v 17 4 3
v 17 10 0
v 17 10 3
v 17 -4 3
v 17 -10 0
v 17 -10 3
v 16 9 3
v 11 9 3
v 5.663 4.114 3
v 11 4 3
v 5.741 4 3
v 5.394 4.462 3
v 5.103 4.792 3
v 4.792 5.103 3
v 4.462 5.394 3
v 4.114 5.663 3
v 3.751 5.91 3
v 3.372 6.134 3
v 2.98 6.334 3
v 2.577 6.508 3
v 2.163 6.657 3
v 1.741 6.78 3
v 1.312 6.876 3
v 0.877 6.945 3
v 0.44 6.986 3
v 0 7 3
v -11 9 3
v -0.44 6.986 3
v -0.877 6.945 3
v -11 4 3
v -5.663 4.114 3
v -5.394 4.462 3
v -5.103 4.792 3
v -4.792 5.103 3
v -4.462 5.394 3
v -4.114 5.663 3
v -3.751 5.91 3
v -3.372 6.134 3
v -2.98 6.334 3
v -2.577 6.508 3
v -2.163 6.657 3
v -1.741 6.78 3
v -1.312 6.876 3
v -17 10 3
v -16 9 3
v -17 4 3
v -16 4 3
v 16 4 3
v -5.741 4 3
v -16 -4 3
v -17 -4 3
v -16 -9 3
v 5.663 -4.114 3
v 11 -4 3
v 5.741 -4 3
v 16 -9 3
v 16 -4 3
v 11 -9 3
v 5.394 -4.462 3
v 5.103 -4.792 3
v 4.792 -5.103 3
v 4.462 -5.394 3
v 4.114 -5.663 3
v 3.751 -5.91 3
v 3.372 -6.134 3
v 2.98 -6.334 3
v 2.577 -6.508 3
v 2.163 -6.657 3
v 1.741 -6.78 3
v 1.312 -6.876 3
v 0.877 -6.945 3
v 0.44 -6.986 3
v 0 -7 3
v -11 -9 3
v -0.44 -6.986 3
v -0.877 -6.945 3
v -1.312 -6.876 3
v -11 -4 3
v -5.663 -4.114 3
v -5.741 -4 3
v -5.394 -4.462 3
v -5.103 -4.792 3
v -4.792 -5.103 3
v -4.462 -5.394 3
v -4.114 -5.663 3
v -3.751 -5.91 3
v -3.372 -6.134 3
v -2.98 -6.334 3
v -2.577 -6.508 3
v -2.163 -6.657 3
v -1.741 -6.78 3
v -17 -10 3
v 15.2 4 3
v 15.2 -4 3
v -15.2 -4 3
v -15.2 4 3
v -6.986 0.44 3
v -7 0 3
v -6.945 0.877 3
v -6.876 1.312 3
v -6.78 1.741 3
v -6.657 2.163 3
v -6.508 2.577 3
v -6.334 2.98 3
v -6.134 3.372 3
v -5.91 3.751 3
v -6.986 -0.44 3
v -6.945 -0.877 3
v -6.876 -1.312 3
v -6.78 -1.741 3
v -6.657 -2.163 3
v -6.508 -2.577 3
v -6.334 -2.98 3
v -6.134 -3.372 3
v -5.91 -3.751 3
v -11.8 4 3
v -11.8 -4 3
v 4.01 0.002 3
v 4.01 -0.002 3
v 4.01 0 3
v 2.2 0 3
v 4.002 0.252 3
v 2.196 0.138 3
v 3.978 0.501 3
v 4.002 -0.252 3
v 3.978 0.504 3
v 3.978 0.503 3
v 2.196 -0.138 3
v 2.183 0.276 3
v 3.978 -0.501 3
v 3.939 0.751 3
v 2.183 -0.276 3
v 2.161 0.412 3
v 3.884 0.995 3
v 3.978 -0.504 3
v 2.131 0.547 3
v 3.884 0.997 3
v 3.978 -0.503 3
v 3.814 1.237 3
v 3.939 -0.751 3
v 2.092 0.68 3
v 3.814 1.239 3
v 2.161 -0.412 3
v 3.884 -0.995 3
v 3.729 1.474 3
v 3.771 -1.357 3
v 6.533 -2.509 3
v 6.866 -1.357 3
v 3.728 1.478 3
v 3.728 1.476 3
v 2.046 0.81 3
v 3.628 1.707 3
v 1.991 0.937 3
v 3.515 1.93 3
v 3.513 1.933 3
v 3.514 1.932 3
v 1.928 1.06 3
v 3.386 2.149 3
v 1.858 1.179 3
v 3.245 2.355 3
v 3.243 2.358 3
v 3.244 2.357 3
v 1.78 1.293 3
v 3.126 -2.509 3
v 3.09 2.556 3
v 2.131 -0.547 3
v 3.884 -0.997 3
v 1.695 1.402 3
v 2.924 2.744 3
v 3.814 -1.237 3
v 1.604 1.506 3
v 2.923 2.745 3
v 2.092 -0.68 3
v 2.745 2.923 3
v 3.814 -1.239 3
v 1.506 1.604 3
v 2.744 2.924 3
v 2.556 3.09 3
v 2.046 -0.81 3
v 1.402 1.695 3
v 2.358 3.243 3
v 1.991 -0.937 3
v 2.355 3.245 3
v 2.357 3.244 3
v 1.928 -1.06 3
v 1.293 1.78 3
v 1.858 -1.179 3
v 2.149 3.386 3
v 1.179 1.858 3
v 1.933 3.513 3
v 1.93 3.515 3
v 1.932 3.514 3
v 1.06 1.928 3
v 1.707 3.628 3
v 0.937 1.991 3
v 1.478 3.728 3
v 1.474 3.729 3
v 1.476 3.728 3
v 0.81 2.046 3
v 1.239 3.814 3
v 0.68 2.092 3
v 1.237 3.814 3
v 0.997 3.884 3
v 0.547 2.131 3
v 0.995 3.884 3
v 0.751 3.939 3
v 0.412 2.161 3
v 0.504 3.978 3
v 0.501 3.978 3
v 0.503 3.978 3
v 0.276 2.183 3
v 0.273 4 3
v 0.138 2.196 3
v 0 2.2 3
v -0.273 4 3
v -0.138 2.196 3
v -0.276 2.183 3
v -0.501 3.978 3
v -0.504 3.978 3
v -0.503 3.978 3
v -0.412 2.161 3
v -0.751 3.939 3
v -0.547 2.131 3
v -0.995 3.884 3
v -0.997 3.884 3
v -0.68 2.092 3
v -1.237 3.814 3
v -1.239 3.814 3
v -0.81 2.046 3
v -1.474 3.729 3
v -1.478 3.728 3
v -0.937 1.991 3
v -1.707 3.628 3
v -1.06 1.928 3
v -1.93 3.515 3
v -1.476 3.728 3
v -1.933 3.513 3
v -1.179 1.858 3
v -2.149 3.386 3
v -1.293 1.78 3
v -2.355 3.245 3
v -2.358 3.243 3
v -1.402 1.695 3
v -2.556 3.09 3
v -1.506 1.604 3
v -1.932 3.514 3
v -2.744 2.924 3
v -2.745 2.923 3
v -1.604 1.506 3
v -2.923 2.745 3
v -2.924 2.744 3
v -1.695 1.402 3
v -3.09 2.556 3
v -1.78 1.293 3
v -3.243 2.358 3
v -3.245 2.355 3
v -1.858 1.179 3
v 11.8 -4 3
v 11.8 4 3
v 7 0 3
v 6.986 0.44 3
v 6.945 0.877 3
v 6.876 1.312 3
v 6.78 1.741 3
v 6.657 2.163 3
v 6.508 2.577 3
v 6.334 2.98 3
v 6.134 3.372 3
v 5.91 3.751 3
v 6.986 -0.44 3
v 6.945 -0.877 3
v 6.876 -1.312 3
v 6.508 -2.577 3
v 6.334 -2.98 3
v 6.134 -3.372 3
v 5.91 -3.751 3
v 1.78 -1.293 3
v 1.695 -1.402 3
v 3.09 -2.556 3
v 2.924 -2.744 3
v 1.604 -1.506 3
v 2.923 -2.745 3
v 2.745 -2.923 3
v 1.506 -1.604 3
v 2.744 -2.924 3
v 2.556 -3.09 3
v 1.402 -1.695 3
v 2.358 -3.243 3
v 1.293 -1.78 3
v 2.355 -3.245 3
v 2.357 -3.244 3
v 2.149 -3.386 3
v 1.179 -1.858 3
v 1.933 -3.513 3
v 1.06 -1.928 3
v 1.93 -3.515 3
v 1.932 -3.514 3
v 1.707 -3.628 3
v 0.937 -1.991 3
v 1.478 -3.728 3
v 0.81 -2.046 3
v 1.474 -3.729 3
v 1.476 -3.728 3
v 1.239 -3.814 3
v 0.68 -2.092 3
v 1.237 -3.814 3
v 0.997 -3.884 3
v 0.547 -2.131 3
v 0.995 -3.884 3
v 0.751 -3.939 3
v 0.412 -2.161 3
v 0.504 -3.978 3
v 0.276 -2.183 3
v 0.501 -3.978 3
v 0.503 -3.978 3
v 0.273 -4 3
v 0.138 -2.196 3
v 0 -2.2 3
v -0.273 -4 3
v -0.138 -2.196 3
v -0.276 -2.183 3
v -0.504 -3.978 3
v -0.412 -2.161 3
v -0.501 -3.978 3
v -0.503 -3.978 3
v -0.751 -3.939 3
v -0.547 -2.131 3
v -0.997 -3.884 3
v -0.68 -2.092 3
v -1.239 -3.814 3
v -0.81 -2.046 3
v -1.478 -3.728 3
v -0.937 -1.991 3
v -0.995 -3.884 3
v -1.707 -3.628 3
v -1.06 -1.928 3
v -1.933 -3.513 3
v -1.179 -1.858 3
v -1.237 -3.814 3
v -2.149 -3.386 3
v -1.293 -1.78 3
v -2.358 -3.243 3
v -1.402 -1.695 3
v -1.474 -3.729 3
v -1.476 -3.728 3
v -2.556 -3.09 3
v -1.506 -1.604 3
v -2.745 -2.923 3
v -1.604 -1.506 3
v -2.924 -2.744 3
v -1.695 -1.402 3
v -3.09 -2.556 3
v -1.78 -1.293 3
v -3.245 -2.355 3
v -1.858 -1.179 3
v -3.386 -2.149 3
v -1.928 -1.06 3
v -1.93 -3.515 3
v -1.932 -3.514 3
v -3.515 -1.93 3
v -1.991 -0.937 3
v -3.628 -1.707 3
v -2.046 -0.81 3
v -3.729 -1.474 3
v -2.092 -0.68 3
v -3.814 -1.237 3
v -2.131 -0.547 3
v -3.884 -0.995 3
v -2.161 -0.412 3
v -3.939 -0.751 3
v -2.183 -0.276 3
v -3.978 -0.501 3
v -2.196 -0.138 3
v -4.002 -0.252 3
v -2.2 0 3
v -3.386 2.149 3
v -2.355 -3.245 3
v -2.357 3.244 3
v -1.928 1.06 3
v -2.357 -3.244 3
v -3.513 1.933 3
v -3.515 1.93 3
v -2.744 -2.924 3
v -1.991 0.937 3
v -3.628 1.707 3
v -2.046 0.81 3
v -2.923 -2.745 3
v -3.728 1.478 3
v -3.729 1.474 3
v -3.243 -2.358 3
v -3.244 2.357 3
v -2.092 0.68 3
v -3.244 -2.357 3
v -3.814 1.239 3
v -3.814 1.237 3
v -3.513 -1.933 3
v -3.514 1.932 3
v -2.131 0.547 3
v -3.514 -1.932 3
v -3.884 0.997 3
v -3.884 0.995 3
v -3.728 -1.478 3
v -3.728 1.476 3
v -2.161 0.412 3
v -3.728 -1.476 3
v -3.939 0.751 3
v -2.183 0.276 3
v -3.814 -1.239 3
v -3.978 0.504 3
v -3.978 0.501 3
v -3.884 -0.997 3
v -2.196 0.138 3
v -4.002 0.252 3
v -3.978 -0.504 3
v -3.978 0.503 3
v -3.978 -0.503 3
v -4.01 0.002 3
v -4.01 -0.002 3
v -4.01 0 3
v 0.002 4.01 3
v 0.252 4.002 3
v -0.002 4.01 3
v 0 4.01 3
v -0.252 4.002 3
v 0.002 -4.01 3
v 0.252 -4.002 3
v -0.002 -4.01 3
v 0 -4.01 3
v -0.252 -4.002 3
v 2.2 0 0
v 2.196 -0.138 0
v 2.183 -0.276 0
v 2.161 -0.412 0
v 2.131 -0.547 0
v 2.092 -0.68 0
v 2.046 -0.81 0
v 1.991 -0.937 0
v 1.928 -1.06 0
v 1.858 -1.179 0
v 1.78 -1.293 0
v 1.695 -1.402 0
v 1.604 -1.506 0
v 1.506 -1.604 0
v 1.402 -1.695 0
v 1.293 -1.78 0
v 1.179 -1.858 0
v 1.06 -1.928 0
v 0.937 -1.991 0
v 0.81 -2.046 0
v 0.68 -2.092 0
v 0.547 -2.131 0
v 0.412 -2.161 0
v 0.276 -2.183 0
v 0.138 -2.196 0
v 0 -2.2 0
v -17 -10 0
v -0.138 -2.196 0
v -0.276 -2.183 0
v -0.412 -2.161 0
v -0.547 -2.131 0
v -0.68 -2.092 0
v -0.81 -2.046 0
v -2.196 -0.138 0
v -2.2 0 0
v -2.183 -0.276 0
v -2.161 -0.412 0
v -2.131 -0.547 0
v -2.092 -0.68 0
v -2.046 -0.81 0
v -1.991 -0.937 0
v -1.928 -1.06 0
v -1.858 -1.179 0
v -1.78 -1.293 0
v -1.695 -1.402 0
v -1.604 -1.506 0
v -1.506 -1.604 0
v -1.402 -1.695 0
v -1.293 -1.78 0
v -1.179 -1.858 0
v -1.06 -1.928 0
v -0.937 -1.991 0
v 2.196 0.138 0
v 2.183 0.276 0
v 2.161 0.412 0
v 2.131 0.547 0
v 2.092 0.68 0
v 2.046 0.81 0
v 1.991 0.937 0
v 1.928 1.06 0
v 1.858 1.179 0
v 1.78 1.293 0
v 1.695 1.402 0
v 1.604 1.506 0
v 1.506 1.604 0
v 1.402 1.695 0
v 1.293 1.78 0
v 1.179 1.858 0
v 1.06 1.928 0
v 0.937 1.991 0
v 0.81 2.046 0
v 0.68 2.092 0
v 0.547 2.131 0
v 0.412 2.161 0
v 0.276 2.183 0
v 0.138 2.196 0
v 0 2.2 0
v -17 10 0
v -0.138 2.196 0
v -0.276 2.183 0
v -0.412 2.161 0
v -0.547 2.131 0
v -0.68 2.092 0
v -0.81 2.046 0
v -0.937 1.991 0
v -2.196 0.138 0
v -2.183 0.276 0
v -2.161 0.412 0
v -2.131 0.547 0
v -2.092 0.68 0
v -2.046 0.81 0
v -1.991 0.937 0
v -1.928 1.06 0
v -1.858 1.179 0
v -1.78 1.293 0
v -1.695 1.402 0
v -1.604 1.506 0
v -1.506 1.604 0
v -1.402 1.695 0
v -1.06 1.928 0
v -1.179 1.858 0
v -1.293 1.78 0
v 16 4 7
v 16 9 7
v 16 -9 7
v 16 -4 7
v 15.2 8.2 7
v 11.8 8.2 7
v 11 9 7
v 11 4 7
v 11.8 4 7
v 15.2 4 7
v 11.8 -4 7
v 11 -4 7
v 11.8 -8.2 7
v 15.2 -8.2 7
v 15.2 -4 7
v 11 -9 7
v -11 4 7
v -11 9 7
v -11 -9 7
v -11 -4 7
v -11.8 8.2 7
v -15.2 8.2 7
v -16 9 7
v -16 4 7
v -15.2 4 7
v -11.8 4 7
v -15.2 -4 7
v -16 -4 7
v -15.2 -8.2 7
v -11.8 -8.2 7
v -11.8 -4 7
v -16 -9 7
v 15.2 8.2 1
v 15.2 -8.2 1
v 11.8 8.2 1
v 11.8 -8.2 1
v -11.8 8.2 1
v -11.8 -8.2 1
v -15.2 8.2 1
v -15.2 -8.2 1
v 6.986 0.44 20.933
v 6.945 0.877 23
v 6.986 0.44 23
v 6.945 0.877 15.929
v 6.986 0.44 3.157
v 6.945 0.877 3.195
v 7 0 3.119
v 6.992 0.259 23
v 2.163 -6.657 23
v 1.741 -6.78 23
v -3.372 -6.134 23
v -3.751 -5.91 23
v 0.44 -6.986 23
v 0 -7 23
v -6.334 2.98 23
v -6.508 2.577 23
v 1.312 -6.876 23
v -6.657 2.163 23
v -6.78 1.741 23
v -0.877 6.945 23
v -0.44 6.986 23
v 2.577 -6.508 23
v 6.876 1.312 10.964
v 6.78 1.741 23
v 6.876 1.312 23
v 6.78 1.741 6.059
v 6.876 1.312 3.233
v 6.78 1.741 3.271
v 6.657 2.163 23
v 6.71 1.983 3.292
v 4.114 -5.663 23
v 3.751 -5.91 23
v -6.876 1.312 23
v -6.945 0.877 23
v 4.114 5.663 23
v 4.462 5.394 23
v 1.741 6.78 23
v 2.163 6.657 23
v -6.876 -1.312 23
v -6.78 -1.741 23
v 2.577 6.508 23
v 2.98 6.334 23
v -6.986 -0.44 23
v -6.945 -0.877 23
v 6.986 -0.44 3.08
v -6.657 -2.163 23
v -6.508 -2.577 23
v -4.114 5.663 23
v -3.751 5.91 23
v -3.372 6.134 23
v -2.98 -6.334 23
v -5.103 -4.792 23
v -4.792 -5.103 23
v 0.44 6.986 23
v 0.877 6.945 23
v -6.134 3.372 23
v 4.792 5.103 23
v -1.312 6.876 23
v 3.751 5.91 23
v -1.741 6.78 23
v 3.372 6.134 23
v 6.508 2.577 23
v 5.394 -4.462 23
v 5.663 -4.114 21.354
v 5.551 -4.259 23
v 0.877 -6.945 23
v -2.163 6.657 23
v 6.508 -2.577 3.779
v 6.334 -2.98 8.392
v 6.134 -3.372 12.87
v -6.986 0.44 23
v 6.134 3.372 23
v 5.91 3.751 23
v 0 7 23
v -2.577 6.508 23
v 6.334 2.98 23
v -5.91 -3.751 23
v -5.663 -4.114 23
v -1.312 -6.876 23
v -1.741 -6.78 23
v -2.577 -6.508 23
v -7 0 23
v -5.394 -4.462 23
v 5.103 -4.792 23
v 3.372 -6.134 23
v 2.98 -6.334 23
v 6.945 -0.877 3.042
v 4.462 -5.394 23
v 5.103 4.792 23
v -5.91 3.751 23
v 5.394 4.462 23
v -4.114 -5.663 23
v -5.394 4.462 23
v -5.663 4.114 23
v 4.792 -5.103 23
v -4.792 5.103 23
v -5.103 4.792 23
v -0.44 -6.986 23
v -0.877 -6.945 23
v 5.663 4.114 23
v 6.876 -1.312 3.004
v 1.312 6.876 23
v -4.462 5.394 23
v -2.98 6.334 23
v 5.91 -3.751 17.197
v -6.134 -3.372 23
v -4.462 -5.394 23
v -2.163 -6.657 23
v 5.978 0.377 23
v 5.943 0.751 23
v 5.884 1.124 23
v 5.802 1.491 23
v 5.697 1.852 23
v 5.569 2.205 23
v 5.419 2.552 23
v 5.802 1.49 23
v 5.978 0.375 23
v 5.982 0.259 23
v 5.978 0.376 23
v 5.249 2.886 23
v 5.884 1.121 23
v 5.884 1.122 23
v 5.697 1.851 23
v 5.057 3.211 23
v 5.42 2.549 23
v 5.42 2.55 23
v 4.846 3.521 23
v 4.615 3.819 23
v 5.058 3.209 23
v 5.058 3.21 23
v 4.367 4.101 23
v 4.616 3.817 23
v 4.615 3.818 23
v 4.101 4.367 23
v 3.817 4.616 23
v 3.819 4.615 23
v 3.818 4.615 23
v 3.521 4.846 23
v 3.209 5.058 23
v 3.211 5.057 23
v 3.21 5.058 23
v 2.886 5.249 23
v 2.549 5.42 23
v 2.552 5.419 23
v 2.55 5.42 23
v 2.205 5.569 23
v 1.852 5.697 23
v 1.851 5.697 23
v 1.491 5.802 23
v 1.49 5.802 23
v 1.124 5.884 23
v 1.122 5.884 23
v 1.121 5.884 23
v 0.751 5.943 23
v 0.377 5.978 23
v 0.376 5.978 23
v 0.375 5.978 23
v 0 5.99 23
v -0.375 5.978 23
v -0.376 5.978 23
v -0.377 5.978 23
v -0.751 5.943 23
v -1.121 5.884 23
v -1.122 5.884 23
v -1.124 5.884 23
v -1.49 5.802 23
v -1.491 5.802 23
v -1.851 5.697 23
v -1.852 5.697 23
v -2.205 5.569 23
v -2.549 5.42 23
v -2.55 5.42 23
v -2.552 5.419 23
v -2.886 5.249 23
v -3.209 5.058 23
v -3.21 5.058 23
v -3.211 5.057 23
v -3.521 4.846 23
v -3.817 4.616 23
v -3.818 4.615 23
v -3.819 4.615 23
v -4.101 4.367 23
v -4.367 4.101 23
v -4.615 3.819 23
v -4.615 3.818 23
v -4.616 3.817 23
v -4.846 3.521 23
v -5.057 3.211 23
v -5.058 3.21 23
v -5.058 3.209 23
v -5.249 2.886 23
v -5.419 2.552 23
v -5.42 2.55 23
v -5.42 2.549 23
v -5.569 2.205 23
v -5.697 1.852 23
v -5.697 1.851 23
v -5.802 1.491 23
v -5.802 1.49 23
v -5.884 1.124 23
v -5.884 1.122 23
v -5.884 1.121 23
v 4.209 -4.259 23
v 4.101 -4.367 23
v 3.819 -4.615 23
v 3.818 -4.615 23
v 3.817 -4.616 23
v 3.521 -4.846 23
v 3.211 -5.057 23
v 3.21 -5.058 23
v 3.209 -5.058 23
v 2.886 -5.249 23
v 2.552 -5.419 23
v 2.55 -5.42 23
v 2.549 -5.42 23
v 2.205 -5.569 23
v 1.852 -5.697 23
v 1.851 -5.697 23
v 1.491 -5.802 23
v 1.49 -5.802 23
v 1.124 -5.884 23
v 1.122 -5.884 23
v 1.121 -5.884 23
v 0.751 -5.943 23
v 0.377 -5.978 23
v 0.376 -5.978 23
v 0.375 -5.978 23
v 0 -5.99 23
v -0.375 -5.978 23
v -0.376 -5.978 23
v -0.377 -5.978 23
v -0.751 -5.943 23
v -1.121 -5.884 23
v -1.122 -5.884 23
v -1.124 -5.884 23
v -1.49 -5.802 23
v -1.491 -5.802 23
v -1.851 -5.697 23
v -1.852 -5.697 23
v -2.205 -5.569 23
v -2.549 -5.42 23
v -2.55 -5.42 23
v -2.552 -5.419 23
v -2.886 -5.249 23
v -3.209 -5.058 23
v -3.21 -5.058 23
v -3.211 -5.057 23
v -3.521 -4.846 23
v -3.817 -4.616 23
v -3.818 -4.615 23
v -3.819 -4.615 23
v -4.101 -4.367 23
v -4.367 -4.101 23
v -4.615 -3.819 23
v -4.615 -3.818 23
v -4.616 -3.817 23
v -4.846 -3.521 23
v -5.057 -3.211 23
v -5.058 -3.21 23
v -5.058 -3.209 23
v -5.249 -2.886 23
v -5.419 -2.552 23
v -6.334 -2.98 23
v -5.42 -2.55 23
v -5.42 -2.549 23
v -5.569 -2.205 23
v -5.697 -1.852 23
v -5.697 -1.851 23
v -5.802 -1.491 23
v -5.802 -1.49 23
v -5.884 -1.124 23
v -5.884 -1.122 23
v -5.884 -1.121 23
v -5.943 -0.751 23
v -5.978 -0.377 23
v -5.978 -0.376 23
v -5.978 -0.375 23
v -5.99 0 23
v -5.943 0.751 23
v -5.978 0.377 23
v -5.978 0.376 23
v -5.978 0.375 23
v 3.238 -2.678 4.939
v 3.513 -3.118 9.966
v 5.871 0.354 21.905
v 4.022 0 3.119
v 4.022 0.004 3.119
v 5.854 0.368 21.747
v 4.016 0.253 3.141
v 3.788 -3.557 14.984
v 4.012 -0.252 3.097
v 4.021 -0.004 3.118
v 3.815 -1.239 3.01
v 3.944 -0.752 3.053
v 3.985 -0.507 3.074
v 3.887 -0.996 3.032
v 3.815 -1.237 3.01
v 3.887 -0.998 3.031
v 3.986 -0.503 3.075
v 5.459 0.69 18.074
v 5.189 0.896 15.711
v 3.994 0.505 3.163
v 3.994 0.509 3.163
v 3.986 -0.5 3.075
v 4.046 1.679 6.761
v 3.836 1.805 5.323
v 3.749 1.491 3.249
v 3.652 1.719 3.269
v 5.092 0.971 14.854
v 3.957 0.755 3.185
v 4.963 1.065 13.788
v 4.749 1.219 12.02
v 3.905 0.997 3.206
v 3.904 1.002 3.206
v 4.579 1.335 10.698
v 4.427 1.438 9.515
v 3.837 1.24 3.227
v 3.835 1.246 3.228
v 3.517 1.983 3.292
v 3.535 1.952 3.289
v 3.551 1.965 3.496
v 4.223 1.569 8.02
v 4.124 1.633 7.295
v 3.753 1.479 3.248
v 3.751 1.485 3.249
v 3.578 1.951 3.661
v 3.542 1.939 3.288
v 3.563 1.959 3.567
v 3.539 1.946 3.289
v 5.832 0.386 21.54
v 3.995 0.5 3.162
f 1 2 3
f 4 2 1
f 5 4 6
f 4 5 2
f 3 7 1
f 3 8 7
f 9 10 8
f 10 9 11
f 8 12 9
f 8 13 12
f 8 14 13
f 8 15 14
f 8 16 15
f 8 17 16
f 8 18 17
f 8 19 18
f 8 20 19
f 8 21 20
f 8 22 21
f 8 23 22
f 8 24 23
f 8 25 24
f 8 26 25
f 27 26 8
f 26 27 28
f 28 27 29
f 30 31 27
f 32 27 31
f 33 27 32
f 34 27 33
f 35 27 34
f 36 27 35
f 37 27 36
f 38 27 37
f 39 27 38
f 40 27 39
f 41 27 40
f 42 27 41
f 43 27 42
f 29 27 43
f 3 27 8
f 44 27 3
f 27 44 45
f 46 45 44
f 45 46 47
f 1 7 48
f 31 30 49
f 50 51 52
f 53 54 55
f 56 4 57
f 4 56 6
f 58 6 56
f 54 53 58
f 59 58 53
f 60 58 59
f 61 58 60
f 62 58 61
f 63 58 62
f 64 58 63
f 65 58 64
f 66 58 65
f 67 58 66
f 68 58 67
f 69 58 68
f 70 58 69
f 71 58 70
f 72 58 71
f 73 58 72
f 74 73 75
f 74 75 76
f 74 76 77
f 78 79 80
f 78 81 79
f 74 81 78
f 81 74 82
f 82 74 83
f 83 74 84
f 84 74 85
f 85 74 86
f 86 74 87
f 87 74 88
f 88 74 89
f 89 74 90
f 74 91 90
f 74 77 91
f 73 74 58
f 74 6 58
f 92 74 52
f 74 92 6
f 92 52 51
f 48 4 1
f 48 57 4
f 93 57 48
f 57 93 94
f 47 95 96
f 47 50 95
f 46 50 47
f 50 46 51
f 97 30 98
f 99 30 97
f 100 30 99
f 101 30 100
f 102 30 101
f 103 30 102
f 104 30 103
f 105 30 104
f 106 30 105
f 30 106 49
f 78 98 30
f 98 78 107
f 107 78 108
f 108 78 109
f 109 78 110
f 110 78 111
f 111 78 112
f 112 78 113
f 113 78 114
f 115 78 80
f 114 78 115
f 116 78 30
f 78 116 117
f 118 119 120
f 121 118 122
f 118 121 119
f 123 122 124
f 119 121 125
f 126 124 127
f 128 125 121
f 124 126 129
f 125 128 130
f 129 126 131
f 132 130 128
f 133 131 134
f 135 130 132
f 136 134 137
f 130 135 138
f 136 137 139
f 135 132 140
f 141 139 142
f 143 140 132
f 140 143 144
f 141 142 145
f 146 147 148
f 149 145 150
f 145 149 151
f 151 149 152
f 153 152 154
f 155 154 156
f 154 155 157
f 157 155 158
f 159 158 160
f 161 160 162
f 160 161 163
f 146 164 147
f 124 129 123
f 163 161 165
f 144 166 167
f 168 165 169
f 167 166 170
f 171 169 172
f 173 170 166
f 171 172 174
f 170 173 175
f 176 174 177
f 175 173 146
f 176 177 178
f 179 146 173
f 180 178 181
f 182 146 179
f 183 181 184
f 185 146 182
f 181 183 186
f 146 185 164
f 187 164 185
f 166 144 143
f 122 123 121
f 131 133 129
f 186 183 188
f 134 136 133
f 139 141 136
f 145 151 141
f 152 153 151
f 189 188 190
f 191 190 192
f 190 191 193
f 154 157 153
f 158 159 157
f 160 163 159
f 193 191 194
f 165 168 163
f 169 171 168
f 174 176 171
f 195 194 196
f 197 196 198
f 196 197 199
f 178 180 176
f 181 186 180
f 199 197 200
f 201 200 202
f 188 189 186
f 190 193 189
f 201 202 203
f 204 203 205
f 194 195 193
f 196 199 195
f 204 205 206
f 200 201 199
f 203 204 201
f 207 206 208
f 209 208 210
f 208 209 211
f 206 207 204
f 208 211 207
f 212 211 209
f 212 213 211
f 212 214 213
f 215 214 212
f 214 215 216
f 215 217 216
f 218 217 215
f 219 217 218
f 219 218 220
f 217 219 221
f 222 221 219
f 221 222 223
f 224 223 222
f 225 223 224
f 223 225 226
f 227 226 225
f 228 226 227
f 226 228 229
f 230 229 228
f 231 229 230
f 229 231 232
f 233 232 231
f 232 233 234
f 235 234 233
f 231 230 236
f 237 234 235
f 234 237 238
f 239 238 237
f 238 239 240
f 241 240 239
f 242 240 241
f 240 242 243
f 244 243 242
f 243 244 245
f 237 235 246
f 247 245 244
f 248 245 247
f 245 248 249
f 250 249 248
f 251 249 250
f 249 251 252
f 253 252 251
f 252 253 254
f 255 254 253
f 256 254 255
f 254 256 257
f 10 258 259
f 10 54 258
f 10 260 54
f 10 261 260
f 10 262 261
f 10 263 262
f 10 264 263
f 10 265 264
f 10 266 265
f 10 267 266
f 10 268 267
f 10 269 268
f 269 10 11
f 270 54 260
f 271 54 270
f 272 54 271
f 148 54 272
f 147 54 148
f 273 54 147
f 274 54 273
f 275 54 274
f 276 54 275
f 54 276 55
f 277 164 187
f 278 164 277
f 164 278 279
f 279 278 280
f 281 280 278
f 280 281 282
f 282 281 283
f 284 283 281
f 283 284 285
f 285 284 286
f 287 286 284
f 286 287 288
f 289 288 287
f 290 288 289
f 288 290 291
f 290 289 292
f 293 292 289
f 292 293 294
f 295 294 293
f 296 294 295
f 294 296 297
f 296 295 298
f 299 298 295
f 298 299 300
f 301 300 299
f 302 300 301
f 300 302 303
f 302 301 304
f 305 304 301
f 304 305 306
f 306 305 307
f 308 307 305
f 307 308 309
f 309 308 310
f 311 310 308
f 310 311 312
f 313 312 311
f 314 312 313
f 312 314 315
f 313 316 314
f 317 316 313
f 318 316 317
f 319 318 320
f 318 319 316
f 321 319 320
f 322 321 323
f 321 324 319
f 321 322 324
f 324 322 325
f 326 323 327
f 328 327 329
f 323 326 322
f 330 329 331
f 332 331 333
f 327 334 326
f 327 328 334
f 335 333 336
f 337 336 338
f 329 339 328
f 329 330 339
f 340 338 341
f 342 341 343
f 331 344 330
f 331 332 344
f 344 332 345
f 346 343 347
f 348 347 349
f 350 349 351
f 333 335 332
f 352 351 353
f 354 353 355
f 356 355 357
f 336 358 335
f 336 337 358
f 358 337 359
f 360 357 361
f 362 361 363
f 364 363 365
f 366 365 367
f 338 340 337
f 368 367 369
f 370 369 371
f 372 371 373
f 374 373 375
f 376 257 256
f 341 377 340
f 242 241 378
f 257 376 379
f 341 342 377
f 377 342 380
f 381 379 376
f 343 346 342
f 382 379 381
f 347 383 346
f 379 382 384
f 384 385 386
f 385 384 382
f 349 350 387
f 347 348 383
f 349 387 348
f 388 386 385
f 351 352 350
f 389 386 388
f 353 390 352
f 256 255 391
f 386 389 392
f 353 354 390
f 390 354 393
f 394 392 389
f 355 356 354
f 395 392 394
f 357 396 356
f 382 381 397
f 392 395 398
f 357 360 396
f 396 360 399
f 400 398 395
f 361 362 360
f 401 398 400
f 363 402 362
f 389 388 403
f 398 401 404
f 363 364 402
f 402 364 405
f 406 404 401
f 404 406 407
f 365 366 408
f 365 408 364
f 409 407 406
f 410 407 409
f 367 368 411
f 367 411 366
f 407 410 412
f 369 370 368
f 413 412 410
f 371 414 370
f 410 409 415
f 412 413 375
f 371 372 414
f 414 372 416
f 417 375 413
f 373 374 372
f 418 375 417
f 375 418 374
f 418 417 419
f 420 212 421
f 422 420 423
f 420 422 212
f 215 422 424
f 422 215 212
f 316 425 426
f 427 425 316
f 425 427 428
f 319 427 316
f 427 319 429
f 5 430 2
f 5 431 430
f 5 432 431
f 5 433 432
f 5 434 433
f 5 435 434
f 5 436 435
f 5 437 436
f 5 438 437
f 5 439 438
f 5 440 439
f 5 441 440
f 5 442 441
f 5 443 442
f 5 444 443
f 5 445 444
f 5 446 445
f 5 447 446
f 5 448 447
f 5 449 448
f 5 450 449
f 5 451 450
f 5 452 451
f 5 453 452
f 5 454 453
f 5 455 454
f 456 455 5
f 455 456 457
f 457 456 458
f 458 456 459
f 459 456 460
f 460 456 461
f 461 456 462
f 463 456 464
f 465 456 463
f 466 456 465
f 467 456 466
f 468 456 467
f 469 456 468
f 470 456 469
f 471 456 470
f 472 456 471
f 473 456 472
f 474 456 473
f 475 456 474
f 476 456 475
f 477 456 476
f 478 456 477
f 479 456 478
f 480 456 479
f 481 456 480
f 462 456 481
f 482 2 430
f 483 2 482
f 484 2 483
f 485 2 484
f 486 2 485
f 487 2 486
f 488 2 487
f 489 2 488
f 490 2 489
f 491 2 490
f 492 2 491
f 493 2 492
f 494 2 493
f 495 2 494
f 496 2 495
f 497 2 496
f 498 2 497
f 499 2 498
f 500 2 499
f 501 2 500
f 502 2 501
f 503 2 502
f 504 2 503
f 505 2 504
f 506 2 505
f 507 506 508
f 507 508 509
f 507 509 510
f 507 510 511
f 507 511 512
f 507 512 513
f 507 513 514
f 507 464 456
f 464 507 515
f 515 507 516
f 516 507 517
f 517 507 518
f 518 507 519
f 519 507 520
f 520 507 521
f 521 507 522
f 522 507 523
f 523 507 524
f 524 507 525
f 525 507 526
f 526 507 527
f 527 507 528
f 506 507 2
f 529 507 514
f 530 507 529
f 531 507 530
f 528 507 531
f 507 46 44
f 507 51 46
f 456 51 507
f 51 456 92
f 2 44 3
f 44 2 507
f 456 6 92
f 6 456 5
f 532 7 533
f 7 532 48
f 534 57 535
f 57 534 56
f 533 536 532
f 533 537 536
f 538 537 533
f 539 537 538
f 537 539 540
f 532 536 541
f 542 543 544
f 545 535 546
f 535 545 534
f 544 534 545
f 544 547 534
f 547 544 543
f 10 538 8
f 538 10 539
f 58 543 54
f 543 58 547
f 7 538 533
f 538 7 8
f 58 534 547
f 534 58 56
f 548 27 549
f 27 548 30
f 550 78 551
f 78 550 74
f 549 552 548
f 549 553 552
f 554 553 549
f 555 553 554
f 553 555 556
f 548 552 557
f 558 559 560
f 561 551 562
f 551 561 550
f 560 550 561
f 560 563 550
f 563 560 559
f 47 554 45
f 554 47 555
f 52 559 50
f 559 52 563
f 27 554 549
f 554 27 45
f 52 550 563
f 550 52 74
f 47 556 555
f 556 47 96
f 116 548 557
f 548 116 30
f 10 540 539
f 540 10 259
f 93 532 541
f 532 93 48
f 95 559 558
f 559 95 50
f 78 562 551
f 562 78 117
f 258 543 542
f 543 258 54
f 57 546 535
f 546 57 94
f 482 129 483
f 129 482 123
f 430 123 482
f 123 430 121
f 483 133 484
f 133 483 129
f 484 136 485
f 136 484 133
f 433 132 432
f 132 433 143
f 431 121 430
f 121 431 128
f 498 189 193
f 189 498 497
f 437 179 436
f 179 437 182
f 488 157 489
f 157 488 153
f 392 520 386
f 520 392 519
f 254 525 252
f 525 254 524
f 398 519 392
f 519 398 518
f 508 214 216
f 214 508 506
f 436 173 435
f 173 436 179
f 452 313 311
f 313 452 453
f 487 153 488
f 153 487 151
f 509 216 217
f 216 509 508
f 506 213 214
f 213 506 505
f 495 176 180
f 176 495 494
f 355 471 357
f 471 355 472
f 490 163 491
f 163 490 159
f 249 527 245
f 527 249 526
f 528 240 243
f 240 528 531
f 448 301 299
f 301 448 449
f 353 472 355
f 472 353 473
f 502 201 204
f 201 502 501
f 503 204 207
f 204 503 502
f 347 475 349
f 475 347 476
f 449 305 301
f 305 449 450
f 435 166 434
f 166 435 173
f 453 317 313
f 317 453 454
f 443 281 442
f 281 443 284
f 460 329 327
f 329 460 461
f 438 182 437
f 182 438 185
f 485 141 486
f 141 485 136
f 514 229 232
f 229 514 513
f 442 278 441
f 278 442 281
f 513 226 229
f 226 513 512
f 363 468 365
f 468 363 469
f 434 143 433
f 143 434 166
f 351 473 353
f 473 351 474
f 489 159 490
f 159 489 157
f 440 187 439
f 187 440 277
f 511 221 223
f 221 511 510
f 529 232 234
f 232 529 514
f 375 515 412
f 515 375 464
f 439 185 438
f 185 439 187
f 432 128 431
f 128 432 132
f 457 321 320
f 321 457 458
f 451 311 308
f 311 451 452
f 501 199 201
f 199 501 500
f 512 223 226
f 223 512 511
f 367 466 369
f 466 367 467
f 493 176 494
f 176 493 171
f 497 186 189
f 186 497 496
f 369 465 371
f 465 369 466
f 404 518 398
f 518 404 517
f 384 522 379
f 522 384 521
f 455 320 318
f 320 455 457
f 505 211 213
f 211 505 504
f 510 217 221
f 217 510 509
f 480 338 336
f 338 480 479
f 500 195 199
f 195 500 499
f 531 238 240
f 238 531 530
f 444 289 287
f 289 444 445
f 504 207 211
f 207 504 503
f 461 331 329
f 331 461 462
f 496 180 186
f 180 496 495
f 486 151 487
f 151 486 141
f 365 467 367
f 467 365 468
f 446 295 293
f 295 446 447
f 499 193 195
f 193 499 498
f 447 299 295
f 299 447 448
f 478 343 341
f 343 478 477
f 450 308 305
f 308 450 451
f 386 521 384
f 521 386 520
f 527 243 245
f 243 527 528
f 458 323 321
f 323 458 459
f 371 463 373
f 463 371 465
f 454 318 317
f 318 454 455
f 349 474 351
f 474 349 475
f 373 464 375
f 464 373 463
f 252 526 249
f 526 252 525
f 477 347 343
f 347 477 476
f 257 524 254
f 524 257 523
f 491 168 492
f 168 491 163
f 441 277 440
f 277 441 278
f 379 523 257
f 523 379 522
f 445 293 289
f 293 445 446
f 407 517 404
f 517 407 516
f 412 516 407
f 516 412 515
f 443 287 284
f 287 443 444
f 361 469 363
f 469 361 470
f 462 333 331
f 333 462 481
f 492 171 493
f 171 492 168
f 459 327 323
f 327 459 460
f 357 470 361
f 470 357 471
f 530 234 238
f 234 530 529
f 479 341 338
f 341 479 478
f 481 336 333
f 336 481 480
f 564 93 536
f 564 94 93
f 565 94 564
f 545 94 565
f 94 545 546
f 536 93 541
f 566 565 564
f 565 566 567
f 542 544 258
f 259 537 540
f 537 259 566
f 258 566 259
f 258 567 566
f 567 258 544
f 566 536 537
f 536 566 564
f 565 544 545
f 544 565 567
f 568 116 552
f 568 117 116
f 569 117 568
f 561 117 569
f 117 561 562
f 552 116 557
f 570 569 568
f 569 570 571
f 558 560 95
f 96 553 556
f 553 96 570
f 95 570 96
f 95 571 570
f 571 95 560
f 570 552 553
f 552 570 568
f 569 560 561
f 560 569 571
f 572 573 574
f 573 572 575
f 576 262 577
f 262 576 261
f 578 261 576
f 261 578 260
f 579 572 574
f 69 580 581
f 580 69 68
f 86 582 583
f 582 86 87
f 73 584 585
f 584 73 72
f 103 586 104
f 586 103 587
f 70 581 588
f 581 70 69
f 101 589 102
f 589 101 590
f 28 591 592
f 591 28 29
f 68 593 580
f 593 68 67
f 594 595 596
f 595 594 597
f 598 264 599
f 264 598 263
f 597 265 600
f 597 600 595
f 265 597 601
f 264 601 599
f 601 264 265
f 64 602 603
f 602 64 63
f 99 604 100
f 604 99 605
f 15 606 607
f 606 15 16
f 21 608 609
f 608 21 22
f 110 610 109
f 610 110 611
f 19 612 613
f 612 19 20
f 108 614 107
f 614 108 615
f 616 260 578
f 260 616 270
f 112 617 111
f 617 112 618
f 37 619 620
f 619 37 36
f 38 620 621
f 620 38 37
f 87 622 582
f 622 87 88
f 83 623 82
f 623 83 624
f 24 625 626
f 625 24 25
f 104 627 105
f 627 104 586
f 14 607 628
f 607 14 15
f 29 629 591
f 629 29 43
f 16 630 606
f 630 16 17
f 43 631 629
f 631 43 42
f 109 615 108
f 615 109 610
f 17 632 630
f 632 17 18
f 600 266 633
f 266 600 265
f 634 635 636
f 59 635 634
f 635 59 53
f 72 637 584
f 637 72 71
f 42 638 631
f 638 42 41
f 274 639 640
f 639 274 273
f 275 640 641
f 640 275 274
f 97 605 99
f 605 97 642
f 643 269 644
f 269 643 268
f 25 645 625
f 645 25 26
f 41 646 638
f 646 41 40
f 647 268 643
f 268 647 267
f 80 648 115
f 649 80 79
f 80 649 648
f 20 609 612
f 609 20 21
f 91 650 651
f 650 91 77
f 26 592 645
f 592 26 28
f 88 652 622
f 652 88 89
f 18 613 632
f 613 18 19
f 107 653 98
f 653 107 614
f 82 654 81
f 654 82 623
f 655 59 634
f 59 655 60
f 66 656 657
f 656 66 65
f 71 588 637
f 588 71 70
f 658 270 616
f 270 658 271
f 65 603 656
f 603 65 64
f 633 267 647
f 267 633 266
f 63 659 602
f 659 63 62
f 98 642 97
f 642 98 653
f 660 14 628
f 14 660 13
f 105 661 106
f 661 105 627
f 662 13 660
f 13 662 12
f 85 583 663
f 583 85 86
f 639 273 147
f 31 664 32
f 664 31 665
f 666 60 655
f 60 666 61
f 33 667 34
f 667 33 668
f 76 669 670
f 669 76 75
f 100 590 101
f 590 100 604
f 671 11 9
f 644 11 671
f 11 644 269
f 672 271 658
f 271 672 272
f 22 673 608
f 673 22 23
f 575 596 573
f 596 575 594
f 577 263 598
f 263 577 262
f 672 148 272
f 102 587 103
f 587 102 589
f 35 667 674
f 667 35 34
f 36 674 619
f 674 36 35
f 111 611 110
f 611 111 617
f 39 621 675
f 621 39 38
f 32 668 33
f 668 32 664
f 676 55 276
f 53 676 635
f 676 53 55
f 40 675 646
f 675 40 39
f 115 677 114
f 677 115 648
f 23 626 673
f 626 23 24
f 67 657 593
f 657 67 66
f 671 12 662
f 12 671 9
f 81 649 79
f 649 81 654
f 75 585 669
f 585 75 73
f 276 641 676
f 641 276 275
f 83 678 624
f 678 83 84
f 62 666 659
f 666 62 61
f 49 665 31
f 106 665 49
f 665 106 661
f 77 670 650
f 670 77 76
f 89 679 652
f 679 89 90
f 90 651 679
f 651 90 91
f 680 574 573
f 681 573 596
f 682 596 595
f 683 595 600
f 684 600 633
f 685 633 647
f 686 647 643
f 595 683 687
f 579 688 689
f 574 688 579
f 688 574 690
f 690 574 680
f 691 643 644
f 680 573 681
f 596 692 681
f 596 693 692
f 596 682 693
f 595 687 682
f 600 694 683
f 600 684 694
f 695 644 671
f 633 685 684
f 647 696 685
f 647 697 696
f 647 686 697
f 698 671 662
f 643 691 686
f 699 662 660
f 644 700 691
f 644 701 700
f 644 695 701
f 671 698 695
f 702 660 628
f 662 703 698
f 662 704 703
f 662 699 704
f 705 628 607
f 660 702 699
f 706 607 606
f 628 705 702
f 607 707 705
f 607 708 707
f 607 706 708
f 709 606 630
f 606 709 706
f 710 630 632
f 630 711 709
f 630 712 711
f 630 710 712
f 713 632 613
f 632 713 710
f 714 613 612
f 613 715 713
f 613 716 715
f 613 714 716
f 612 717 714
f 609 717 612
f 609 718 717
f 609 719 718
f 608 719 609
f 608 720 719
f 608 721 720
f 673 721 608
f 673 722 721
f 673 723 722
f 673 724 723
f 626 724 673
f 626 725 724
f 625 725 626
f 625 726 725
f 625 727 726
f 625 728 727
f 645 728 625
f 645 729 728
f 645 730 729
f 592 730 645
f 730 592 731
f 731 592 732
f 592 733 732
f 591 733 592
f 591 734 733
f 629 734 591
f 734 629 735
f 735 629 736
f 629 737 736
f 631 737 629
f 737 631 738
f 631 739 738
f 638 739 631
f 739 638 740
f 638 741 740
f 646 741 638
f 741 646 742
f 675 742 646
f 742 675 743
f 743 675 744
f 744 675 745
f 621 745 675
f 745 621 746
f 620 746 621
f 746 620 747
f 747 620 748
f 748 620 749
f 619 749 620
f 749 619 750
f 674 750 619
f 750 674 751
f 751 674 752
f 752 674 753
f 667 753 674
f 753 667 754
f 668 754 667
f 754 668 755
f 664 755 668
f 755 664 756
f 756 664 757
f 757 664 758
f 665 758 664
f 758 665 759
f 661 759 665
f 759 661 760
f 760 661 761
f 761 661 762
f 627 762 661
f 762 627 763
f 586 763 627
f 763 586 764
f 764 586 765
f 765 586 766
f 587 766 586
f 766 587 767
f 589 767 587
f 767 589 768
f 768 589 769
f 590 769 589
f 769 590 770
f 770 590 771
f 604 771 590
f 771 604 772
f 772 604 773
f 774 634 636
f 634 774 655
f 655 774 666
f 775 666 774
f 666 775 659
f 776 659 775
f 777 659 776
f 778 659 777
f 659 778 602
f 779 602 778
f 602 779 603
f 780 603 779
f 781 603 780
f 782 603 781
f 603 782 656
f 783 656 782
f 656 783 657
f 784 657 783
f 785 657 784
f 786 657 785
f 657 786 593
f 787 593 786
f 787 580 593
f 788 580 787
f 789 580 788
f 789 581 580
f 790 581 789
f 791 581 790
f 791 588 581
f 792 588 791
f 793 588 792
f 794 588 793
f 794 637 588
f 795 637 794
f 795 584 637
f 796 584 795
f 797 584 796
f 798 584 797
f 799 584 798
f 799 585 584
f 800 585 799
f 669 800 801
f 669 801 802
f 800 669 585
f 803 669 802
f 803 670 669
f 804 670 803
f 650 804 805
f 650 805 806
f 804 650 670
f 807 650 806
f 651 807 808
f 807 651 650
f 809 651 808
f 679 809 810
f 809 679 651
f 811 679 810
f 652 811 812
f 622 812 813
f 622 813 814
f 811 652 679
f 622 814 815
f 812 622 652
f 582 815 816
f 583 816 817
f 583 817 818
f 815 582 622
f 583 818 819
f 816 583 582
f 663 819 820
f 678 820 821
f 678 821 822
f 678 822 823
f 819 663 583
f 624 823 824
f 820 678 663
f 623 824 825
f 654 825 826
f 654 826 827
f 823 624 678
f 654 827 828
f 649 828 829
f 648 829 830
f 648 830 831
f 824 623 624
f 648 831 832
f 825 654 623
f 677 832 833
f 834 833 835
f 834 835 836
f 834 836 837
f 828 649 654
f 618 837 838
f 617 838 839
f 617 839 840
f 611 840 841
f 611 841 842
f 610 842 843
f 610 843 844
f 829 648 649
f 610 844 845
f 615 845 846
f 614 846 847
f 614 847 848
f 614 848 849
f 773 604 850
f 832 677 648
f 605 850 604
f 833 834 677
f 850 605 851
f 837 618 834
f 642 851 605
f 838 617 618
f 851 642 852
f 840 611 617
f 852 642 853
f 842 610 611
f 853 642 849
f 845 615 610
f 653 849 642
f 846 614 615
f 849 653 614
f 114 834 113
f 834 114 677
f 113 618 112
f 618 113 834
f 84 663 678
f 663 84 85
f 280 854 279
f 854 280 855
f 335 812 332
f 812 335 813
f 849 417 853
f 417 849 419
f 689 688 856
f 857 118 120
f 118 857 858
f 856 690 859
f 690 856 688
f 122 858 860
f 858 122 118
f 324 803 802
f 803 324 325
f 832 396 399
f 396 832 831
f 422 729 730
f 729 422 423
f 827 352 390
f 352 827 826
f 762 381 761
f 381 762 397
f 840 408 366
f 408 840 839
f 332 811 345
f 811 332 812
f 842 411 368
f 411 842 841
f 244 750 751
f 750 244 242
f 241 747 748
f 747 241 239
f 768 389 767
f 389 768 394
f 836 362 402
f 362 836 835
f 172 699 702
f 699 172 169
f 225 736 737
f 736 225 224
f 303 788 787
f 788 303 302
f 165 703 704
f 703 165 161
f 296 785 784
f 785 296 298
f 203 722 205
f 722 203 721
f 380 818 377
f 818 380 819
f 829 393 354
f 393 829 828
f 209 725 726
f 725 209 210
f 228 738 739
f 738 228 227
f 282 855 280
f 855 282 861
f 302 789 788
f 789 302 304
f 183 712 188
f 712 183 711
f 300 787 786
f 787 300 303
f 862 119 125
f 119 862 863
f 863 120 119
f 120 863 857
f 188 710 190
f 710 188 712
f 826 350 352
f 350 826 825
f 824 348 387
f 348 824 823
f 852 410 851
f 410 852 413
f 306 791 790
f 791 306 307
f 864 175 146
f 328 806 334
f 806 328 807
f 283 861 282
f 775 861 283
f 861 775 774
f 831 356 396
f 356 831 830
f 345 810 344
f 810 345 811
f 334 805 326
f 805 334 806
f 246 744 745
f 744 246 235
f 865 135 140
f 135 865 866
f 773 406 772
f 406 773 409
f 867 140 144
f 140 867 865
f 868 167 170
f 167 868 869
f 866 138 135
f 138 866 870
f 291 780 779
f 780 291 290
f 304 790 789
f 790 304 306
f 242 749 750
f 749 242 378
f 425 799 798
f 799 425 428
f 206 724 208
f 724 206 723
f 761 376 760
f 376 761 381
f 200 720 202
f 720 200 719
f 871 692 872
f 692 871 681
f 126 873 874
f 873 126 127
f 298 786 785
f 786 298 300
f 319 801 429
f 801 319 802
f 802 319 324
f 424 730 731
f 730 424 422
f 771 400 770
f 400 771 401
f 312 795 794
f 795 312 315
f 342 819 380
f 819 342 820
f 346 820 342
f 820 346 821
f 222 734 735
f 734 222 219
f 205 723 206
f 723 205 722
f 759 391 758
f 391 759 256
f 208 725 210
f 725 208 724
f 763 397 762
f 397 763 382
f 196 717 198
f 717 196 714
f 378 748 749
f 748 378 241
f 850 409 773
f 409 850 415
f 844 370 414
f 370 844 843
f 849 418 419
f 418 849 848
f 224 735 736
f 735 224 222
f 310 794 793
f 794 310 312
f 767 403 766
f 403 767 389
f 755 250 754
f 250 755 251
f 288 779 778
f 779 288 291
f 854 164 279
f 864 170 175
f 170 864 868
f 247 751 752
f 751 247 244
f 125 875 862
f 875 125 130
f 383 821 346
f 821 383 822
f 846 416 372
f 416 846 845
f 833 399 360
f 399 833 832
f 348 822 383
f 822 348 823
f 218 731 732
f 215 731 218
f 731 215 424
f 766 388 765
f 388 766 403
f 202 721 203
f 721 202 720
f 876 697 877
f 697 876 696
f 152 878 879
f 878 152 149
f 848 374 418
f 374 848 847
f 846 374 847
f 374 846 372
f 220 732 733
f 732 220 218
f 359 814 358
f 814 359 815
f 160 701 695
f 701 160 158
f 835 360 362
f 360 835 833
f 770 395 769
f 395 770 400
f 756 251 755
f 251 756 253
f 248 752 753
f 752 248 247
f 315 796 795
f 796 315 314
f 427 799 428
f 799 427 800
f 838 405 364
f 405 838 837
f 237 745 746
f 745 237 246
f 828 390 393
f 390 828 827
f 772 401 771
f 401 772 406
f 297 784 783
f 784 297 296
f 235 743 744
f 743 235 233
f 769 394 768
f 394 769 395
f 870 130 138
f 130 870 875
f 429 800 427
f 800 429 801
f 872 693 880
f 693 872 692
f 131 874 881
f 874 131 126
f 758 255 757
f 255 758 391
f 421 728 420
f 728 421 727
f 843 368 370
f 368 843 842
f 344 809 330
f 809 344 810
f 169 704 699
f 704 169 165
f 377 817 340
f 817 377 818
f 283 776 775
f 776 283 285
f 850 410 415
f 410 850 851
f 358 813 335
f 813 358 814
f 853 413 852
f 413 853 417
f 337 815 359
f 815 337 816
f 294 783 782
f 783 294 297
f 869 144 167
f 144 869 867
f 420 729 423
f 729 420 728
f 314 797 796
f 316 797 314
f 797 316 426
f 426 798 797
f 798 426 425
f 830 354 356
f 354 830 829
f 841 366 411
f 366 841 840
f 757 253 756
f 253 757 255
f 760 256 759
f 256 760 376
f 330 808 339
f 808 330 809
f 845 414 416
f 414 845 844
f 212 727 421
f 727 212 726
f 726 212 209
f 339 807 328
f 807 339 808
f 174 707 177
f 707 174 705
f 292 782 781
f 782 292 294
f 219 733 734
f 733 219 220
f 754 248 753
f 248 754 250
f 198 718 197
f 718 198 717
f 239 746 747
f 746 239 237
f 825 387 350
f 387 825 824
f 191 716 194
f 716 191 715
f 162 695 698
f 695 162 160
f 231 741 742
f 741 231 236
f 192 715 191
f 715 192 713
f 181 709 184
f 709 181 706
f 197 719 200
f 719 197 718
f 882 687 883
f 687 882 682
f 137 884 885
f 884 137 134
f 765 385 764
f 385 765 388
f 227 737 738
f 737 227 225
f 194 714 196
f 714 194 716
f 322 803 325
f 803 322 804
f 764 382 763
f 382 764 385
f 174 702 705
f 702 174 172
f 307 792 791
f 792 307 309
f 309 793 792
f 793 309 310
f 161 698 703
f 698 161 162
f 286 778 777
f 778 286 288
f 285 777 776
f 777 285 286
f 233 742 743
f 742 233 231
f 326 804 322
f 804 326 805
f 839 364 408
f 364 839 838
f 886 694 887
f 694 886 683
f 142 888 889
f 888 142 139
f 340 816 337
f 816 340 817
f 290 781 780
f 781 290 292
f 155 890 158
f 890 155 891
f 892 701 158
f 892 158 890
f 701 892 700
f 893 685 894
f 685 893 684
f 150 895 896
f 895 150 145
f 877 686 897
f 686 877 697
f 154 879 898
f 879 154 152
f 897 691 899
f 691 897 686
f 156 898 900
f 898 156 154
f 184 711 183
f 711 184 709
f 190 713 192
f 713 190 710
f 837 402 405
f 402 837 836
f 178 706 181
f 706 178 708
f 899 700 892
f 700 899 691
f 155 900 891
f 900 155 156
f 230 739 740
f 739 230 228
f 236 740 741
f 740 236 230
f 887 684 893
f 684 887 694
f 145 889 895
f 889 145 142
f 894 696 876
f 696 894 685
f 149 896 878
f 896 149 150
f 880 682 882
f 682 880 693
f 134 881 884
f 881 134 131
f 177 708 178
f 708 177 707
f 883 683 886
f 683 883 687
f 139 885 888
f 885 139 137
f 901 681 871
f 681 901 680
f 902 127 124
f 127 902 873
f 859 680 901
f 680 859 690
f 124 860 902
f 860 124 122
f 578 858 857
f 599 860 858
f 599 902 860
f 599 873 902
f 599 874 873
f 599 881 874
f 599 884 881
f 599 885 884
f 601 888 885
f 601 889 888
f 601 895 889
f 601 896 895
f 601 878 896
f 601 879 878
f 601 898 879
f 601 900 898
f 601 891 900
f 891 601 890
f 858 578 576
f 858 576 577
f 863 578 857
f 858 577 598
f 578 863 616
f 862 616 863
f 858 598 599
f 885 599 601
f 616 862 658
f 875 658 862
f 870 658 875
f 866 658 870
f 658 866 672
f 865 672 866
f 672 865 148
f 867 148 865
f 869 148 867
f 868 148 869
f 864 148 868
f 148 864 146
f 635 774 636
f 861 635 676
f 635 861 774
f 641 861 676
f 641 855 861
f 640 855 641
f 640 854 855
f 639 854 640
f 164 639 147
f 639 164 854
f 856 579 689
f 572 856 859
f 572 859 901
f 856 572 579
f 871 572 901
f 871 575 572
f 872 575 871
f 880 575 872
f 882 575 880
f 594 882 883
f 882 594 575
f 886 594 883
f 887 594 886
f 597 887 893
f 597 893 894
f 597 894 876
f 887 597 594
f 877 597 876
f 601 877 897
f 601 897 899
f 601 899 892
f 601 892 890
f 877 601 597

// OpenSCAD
print_error=0.2;

$fn=100;

//helix(print_error=print_error);
//base(print_error=print_error);
top(print_error=print_error);

//spring_bender();

/**
 * В сборке.
 */
module spring_bender() {
  helix_height=20;
    
  translate([0, 0, 7]) helix(print_error=print_error);
  base(print_error=print_error);
  //translate([0, 0, helix_height + 11]) rotate([180, 0, 0]) top(print_error=print_error);
}

module helix(print_error=0) {
  key_width=2;
  key_length=15;
    
  // берем по 4мм на каждый виток: 2 на проволоку+2 на спираль,
  // 5 витков: 4*5=20мм
  helix_height=20;
    
  difference() {
    union() {
      // главный вал
      cylinder(h=helix_height, r1=4, r2=2);
          
      // вал сверху
      //translate([0, 0, helix_height]) cylinder(h=10, r=2);
        
      // спиралька
      linear_extrude(height=20, twist=-360*5, center=false, scale=.65) 
        translate([2.5, 0, 0]) circle(r=3);//scale([1, 3, 1]) circle(r=1);
    }
    
    // дырка сверху
    //translate([0, 0, helix_height-4]) cylinder(h=5+5+0.2, r=1);
    translate([-1, -1, helix_height-6]) cube([2, 2, 10]);
    
    // дырка сбоку для проволоки
    translate([0, -1, helix_height]) rotate([-90, 0, 0]) cylinder(h=6, r=0.5+print_error);
    
    // еще дырка сверху для поворотного ключа
    translate([0, -5, helix_height+5]) rotate([-90, 0, 0]) cylinder(h=10, r=0.5+print_error);
    
    // и еще дырка сверху для поворотного ключа
    translate([0, -5, helix_height+8]) rotate([-90, 0, 0]) cylinder(h=10, r=0.5+print_error);
  }
  
  // спиралька
  //linear_extrude(height=20, twist=-360*5, center=false, scale=.65) 
  //  translate([2.5, 0, 0]) circle(r=3);//scale([1, 3, 1]) circle(r=1);
  
  
  // углы для квадратной основы пружины,
  translate([0, 0, -3]) difference() { 
    // 10мм внешний периметр
    translate([-5, -5, 0]) cube([10, 10, 3]);
      
    // пазы по периметру
    // сверху (x,y)
    translate([-5-0.1, 4, 1]) cube([10.2, 1.1, 2.1]);
    // снизу (x,y)
    translate([-5-0.1, -5-0.1, 1]) cube([10.2, 1.1, 2.1]);
    // слева (x,y)
    translate([-5-0.1, -5-0.1, 1]) cube([1.1, 10.2, 2.1]);
    // справа (x,y)
    translate([4, -5-0.1, 1]) cube([1.1, 10.2, 2.1]);
      
    // вход для проволоки
    translate([-2, -5-0.1, 2-0.1]) cube([4, 1.1, 1.2]);
  }
  
  // Вал снизу
  translate([0, 0, -3-2]) cylinder(h=2, r=7);
}

module base(print_error=0) {
  key_width=2;
  key_length=15;
    
  // берем по 4мм на каждый виток: 2 на проволоку+2 на спираль,
  // 5 витков: 4*5=20мм
  helix_height=20;
   
  difference() {
    translate([-17, -10, 0]) cube([34, 20, 3]);
    
    // отверстие
    translate([0, 0, 1]) cylinder(r=7+print_error, h=2+0.1);
  }
  
  // щель для проволоки
  difference() {
    translate([12, -8, 0]) cube([3, 16, 8+helix_height]);
    translate([11, 1, 0]) rotate([5, 0, 0]) cube([5, 2, 10+helix_height+0.1]);
  }
  
  // вторая стенка
  translate([-15, -8, 0]) cube([3, 16, 8+helix_height]);
}

module top(print_error=0) {
    
  // берем по 4мм на каждый виток: 2 на проволоку+2 на спираль,
  // 5 витков: 4*5=20мм
  helix_height=20;
    
  //
    
  difference() {
    union() {
      translate([-17, -10, 0]) cube([34, 20, 3]);
      
      // под стенку с щелками держать
      translate([11, -9, 0]) cube([5, 18, 7]);
        
      // под вторую стенку
      translate([-16, -9, 0]) cube([5, 18, 7]);
    }
    
    // срезать выступающие "коробки" под уголки
    translate([-17, -4, 3]) cube([34, 8, 4.1]);
    
      
    // под цилиндр вращать спираль
    translate([0, 0, -0.1]) cylinder(h=3+0.2, r=2+print_error);
      
    // под стенку с щелками держать
    translate([12-print_error, -8-print_error, 1]) cube([3+print_error*2, 16+print_error*2, 6.1]);
      
    // под вторую стенку
    translate([-15-print_error, -8-print_error, 1]) cube([3+print_error*2, 16+print_error*2, 6.1]);
  }
  
  // внешний цилиндр - стенки для конуса:
  translate([0, 0, 3]) difference() {
    cylinder(h=helix_height, r=6+1);
    
    // большой диаметр конуса вместе со спиралью - 10мм
    // малый диаметр конуса вместе со спиралькой - 8мм
    translate([0, 0, -0.1]) cylinder(h=helix_height+0.2, r1=3+1, r2=5+1);
      
    // щель для проволоки
    translate([3, -2.5, -0.1]) rotate([5, 0, 0]) cube([4, 4.5, helix_height+0.2]);
  }
}
